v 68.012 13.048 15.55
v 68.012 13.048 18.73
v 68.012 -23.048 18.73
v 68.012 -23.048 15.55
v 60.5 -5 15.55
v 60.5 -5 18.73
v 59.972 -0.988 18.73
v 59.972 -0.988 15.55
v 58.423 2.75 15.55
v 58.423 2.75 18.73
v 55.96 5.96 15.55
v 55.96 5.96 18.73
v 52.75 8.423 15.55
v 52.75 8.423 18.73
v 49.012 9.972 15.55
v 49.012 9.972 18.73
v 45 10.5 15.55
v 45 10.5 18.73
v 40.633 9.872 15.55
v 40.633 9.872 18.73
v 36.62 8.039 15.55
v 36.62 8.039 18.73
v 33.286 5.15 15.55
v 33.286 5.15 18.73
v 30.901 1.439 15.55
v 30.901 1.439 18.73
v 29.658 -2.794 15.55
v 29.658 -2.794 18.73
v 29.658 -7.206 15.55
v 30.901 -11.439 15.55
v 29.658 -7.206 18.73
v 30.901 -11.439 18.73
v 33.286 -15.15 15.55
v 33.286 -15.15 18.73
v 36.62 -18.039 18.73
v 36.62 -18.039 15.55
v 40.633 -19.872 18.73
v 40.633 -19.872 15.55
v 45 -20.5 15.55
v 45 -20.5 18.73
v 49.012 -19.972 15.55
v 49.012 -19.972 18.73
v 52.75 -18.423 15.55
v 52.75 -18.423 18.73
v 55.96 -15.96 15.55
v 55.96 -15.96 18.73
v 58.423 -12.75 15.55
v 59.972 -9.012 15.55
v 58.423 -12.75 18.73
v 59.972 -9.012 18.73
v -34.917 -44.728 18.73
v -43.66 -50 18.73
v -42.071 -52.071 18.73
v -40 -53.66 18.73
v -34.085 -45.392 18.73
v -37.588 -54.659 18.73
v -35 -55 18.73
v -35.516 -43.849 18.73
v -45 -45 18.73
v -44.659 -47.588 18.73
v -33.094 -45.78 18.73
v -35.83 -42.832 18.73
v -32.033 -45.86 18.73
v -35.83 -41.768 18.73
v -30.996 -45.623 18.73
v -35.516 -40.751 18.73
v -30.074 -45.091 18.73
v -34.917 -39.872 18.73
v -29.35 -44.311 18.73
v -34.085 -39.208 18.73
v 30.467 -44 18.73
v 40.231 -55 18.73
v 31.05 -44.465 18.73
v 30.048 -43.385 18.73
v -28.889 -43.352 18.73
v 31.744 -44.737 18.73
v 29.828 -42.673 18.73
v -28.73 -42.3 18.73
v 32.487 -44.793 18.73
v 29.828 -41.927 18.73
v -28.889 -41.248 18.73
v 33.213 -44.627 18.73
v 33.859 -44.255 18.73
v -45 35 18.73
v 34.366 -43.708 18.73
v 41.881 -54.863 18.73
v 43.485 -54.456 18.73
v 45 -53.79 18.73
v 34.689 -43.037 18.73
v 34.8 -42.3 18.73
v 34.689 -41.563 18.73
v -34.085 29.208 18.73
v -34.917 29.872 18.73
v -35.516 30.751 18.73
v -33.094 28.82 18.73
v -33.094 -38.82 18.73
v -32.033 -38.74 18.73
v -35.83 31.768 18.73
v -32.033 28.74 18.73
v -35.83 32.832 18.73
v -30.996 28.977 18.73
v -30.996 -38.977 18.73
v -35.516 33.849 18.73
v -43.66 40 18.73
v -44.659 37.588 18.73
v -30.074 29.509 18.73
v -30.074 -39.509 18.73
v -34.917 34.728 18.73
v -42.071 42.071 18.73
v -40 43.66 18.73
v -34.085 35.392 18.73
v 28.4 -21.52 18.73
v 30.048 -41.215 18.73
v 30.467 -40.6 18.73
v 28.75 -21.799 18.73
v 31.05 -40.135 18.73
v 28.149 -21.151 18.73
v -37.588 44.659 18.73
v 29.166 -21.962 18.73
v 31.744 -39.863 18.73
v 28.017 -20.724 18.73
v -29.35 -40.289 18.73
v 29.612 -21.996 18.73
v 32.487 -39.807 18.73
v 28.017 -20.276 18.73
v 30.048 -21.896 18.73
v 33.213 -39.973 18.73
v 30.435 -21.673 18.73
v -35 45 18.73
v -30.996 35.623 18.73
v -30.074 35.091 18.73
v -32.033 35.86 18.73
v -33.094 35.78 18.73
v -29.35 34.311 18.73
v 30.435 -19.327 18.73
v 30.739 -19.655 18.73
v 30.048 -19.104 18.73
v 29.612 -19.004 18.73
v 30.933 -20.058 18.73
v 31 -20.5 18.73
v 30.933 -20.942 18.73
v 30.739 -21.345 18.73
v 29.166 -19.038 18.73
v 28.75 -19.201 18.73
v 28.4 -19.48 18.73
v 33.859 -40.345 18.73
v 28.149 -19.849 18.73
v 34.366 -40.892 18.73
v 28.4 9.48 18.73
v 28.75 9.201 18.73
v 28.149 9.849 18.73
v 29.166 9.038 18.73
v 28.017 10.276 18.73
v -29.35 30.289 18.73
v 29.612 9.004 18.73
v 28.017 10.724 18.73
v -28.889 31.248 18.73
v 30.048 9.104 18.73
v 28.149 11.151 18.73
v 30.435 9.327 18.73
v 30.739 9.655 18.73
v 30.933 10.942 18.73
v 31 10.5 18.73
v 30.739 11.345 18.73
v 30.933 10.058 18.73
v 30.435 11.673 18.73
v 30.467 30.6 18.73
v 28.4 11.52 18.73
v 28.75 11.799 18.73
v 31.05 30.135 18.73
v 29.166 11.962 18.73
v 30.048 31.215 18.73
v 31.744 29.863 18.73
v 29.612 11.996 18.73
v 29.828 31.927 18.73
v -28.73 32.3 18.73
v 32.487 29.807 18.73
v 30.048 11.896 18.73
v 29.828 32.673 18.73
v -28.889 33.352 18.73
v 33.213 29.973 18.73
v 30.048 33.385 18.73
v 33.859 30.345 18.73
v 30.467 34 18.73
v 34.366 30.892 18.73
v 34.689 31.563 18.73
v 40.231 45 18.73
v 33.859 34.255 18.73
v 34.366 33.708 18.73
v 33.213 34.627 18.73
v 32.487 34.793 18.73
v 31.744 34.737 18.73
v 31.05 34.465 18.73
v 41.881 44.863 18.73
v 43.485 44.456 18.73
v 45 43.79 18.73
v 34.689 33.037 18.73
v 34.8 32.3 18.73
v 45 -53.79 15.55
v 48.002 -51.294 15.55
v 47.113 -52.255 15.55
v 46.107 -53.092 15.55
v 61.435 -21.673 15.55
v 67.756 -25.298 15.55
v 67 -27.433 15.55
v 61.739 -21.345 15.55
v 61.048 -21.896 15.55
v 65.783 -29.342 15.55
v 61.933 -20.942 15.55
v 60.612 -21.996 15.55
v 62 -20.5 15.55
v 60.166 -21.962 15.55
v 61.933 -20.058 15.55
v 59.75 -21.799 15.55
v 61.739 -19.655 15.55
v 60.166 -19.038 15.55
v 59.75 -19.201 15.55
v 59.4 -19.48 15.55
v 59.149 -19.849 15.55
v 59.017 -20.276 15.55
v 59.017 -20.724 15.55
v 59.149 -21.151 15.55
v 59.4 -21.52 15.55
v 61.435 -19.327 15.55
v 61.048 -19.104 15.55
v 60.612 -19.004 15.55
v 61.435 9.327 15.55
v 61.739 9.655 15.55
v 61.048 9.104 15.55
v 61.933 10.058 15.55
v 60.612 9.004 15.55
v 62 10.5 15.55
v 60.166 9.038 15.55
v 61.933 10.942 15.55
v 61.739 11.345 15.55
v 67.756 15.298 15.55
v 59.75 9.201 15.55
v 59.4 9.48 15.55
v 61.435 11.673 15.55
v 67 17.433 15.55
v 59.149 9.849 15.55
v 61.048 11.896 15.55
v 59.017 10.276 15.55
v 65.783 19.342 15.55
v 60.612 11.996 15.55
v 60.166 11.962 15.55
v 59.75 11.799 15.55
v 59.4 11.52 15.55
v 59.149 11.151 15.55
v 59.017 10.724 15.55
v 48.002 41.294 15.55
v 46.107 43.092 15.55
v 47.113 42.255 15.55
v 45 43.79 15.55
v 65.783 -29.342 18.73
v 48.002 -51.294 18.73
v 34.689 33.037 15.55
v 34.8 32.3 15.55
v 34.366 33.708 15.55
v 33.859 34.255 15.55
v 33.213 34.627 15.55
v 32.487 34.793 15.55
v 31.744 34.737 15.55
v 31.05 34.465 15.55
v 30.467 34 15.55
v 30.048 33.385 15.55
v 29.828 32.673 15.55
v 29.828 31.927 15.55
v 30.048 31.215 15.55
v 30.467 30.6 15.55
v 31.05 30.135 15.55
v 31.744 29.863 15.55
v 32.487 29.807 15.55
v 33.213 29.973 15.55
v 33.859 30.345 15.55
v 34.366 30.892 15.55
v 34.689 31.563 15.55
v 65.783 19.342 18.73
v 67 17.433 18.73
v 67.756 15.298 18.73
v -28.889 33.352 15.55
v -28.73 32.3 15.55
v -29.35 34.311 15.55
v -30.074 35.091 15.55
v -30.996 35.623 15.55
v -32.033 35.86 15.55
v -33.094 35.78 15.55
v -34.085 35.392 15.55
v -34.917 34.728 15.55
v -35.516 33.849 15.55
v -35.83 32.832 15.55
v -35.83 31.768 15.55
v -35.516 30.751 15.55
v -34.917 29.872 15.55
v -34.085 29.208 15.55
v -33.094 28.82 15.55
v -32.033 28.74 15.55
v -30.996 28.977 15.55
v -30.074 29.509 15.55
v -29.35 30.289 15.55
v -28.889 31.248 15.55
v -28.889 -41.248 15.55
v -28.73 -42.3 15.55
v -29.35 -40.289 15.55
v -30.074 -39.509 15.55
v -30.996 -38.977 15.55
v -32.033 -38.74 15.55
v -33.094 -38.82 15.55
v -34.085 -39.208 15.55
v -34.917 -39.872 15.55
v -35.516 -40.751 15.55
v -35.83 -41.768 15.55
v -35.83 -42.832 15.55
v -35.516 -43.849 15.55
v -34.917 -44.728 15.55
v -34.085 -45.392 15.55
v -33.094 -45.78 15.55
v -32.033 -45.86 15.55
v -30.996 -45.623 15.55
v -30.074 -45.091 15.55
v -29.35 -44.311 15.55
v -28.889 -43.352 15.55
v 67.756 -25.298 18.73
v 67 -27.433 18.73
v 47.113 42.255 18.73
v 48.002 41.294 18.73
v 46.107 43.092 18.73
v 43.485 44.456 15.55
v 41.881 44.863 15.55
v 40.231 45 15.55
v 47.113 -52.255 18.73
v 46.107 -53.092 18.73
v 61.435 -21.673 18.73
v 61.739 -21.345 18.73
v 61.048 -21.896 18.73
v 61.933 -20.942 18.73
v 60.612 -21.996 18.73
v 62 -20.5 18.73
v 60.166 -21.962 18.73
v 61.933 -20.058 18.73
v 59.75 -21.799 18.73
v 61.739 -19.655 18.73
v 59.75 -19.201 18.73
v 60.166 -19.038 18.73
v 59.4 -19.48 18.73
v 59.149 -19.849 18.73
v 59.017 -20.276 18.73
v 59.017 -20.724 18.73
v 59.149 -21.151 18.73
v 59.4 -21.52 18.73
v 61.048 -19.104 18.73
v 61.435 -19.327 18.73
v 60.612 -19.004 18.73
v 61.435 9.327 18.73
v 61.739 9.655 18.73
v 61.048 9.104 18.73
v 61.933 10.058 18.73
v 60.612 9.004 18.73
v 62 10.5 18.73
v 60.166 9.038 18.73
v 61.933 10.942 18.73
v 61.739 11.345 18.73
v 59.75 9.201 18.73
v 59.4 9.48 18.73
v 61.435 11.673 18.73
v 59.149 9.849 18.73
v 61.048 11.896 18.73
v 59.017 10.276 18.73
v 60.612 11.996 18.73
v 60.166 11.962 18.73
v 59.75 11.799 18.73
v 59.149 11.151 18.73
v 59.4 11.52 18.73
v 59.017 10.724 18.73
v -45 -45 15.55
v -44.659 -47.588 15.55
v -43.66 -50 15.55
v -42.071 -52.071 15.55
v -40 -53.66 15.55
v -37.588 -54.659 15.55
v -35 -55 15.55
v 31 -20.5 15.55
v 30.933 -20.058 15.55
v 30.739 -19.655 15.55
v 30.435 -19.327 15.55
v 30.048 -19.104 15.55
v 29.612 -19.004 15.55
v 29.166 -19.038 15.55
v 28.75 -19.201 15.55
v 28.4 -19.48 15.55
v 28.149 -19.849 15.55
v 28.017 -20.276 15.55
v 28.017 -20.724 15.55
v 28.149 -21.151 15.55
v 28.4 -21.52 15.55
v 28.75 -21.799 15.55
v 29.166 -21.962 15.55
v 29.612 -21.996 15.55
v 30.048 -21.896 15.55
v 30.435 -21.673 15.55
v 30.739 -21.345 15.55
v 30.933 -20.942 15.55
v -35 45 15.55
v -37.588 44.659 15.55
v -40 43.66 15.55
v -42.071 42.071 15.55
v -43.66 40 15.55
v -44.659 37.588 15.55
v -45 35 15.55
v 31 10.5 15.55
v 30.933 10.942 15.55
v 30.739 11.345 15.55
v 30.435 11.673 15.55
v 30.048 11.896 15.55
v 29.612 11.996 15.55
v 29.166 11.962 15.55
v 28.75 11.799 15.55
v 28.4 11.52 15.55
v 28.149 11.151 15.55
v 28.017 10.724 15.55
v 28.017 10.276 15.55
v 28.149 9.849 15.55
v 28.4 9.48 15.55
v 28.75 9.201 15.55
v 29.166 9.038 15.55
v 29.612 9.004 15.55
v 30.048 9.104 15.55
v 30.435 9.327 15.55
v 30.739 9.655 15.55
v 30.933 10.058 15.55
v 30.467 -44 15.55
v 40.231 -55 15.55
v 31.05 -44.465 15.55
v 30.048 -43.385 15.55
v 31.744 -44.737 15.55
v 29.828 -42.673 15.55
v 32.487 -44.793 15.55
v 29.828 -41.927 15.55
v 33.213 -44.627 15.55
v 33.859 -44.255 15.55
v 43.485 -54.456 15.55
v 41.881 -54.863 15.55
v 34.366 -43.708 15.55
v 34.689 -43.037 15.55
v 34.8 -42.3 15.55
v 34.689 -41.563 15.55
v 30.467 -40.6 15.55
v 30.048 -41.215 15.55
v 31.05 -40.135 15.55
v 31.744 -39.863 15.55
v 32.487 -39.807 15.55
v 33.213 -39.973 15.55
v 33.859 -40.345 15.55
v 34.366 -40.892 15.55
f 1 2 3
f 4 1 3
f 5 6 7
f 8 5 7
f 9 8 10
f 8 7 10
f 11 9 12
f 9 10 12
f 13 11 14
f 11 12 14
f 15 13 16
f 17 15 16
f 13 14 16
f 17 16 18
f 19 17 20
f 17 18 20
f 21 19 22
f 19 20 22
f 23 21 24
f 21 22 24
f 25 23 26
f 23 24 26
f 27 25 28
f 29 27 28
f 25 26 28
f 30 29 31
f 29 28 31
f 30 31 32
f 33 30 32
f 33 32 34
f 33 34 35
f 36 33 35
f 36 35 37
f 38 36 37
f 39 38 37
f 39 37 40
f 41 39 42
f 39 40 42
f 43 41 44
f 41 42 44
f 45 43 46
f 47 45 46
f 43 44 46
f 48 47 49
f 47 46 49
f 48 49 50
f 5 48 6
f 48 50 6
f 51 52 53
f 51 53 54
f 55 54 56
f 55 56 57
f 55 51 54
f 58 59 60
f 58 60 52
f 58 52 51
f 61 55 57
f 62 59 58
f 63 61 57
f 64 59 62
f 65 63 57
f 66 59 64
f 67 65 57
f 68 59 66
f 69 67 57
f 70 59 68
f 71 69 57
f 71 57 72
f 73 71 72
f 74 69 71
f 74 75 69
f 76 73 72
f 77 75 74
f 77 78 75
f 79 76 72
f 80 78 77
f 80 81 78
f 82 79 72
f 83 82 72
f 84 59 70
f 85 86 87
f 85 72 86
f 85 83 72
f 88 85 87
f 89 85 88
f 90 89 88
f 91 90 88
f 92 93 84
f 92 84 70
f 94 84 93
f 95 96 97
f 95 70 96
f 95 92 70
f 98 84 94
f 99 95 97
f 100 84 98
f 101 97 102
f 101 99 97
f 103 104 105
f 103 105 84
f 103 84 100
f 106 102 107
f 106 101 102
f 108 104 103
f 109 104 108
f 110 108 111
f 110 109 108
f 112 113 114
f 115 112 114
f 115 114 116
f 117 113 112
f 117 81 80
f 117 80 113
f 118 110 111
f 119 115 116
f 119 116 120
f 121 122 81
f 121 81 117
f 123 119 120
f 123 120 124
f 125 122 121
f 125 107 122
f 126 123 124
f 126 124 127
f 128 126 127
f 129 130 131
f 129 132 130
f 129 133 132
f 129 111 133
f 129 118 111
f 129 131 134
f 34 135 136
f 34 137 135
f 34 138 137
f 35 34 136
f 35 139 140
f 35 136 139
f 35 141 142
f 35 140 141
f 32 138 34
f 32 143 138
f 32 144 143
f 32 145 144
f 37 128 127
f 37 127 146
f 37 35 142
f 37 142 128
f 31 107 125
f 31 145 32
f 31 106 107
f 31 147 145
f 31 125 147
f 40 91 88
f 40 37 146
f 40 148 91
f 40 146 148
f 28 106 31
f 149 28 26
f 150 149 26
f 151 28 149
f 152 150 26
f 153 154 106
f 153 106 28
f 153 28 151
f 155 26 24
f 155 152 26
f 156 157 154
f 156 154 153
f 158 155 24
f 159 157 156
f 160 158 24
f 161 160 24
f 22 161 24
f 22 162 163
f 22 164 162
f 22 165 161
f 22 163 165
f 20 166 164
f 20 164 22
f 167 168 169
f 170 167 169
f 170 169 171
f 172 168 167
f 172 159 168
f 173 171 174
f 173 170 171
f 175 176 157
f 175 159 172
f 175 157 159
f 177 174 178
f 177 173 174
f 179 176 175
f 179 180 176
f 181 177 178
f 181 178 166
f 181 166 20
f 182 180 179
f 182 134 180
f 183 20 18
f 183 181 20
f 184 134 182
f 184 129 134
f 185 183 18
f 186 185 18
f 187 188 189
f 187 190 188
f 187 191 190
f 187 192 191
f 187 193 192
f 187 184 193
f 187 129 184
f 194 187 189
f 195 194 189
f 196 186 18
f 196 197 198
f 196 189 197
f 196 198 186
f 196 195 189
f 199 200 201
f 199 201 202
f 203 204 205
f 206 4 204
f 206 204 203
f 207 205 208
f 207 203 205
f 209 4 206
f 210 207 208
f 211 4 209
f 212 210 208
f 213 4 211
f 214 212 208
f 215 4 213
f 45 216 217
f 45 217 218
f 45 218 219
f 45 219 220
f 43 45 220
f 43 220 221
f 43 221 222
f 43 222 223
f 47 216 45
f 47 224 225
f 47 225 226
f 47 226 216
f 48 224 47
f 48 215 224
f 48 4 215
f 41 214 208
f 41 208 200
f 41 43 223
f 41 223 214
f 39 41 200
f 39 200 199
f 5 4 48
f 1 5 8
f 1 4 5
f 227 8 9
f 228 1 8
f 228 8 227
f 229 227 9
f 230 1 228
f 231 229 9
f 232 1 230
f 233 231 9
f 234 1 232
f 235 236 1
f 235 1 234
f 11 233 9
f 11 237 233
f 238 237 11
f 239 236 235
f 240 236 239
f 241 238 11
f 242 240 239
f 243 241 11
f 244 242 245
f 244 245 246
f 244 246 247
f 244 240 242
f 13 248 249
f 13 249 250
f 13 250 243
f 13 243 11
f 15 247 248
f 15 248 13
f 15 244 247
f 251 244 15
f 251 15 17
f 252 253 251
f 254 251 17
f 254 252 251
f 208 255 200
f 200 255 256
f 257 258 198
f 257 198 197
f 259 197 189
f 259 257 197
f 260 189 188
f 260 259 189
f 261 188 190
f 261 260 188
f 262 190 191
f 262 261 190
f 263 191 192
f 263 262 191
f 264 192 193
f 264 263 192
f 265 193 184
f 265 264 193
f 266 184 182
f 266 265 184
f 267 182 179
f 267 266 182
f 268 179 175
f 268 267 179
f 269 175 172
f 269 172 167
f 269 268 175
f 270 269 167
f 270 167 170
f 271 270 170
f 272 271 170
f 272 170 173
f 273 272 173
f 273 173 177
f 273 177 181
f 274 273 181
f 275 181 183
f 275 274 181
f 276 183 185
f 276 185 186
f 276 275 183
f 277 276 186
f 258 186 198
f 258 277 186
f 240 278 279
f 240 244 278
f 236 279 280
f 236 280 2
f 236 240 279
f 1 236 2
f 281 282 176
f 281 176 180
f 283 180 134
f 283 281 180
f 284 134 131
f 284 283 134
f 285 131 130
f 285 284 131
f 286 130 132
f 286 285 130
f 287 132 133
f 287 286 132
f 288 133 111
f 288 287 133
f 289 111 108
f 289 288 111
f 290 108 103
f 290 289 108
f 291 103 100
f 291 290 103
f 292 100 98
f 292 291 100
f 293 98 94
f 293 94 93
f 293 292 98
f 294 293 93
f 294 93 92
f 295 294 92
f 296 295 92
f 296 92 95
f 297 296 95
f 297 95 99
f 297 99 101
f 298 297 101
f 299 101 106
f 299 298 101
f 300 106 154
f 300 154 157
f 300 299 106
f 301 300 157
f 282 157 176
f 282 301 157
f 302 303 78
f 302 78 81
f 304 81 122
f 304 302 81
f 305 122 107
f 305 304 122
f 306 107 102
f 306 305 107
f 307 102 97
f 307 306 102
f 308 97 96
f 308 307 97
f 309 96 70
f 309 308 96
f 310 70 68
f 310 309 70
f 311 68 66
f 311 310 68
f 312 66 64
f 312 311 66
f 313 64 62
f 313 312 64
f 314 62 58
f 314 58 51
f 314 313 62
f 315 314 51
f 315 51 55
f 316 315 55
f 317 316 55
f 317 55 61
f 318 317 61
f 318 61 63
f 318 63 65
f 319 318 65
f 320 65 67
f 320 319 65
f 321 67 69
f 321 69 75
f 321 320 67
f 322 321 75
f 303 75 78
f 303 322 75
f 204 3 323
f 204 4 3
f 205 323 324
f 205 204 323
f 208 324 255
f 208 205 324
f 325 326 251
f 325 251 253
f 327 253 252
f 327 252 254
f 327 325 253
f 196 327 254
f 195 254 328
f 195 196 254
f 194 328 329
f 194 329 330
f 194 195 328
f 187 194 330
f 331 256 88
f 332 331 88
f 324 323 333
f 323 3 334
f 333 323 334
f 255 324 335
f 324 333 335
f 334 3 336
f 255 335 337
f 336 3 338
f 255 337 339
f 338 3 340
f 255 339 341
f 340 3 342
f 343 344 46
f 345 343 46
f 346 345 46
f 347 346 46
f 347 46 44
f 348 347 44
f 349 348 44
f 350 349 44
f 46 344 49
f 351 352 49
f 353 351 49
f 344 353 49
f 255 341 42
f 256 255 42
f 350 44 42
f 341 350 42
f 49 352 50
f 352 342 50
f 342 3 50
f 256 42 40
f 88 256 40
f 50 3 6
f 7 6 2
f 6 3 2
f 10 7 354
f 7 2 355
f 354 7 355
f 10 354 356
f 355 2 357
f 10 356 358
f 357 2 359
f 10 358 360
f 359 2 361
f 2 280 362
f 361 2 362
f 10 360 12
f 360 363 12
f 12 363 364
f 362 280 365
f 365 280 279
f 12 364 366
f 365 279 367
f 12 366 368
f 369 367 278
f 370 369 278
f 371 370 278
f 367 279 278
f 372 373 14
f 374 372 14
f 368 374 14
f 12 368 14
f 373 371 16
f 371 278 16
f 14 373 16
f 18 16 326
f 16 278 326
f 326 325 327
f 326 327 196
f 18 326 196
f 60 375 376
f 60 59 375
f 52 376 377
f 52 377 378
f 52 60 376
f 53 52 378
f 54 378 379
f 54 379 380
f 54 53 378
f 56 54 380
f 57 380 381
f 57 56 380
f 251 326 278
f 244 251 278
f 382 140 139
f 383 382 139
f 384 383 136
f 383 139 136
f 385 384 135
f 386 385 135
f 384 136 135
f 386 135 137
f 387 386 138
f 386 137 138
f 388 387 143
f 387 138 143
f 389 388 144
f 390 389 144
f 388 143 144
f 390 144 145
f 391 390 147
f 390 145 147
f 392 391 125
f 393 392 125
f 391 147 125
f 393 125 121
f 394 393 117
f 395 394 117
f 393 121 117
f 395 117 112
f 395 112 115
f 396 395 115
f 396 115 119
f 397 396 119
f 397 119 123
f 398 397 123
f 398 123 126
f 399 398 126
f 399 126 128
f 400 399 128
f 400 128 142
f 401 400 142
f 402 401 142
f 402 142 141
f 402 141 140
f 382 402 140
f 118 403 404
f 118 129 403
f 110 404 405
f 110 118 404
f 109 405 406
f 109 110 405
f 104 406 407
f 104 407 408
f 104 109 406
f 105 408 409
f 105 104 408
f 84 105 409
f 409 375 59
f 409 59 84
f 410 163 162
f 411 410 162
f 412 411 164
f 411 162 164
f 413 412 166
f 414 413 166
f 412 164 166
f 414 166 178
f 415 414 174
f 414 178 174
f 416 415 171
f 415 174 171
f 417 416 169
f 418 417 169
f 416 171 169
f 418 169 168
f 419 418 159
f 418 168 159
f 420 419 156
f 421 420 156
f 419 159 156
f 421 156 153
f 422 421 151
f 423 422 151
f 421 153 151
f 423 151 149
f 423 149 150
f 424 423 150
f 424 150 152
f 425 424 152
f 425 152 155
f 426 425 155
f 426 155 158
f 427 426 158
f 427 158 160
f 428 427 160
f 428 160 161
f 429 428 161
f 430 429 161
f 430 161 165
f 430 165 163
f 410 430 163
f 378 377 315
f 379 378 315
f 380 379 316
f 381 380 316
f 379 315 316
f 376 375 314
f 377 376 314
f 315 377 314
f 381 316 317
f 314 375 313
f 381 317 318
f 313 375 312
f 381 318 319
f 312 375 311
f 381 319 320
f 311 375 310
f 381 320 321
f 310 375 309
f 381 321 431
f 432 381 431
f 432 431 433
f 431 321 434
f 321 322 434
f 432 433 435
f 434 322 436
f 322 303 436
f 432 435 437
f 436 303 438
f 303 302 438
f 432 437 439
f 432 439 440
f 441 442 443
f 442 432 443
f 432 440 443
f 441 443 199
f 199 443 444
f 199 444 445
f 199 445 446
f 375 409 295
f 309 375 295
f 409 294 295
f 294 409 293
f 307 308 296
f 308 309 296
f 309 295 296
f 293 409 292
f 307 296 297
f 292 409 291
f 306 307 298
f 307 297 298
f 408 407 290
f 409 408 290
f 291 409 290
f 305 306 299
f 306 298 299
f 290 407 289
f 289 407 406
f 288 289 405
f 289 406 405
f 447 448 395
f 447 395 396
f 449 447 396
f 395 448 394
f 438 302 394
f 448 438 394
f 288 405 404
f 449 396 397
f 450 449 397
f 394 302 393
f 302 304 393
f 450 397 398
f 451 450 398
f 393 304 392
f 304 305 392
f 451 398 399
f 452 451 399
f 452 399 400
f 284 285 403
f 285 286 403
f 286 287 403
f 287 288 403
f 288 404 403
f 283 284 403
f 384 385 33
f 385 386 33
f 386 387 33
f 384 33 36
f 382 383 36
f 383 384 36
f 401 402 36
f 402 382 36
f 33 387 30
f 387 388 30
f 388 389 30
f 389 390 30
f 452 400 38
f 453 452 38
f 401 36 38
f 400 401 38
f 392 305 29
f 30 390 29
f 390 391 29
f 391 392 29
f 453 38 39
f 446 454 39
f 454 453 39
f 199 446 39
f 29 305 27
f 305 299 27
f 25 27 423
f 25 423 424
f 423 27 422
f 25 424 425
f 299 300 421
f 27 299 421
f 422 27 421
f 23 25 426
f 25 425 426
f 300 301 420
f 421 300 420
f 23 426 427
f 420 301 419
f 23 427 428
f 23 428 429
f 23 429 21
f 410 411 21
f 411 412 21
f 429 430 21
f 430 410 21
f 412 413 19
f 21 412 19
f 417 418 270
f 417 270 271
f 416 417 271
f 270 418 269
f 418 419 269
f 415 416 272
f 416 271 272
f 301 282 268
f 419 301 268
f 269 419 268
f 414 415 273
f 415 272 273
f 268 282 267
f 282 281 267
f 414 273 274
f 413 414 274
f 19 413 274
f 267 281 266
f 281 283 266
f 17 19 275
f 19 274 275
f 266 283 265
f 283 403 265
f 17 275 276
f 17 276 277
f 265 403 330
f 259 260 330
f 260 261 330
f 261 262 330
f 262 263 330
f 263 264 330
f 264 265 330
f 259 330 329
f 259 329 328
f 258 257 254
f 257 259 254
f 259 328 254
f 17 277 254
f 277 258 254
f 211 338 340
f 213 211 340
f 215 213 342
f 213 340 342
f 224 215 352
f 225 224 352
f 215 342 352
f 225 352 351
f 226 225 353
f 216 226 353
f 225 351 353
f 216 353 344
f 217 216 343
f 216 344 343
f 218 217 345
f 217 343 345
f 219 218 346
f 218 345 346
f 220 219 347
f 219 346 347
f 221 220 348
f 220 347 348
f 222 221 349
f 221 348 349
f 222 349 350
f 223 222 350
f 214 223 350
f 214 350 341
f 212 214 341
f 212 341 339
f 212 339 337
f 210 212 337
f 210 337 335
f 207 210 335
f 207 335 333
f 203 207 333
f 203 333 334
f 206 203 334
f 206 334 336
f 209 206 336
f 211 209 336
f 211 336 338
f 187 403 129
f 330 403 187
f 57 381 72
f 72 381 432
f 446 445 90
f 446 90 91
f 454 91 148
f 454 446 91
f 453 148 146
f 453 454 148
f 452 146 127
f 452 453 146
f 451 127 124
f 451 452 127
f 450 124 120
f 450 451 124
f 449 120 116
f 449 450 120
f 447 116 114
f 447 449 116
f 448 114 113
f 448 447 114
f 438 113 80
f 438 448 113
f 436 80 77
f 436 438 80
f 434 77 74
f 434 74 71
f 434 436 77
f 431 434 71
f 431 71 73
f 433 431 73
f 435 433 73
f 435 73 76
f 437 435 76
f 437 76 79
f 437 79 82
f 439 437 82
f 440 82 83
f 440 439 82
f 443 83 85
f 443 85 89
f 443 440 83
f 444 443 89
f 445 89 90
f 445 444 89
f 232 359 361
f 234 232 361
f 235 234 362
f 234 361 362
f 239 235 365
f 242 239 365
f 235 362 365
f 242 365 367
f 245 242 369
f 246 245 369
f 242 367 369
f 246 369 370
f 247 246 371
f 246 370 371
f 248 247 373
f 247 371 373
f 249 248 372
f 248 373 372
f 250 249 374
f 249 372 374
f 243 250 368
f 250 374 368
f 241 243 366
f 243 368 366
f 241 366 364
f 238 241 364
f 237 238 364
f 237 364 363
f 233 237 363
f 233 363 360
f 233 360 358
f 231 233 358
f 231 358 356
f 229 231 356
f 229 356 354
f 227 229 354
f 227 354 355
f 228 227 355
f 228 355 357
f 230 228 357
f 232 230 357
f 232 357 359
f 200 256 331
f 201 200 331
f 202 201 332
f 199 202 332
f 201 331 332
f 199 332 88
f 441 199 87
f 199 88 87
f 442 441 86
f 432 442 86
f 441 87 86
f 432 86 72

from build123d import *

# Parameters (mm, degrees)
BOSS_EXTRUDE1_START = 15.549813
SKETCH1_W           = 90
SKETCH1_H           = 100
SKETCH1_R           = 2.5
SKETCH1_R_2         = 3.57
BOSS_EXTRUDE1_DEPTH = 3.18
BOSS_EXTRUDE2_DEPTH = 3.18
SKETCH3_R           = 1.5
SKETCH3_R_2         = 15.5
CUT_EXTRUDE1_DEPTH  = 10
FILLET1_R           = 10


with BuildPart() as part:
    # Sketch1 → Boss-Extrude1 (new body)
    with BuildSketch(Plane.XY.offset(BOSS_EXTRUDE1_START)):
        with Locations((0, -5)):
            Rectangle(SKETCH1_W, SKETCH1_H)
        with Locations((32.3, -42.3)):
            Circle(SKETCH1_R, mode=Mode.SUBTRACT)
        with Locations((-32.3, -42.3)):
            Circle(SKETCH1_R_2, mode=Mode.SUBTRACT)
        with Locations((-32.3, 32.3)):
            Circle(SKETCH1_R_2, mode=Mode.SUBTRACT)
        with Locations((32.3, 32.3)):
            Circle(SKETCH1_R, mode=Mode.SUBTRACT)
    extrude(amount=BOSS_EXTRUDE1_DEPTH)

    # Sketch2 → Boss-Extrude2 (add, through all)
    with BuildSketch(Plane.XY.offset(18.729812892)):
        Polygon((45, 45), (68.012220348, 16.59), (68.012220348, -26.59), (45, -55), align=None)
    extrude(amount=-BOSS_EXTRUDE2_DEPTH)

    # Sketch3 → Cut-Extrude1 (cut)
    with BuildSketch(Plane.XY.offset(18.729812892)):
        with Locations((29.5, 10.5)):
            Circle(SKETCH3_R)
        with Locations((60.5, 10.5)):
            Circle(SKETCH3_R)
        with Locations((60.5, -20.5)):
            Circle(SKETCH3_R)
        with Locations((29.5, -20.5)):
            Circle(SKETCH3_R)
        with Locations((45, -5)):
            Circle(SKETCH3_R_2)
    extrude(amount=-CUT_EXTRUDE1_DEPTH, mode=Mode.SUBTRACT)

    # Fillet1
    fillet1_edges = [part.edges().sort_by_distance(p)[0] for p in [
        (68.012220348, 16.59, 17.139812892),
        (68.012220348, -26.59, 17.139812892),
        (-45, 45, 17.139813),
        (45, 45, 17.139813),
        (45, -55, 17.139813),
        (-45, -55, 17.139813),
    ]]
    fillet(fillet1_edges, radius=FILLET1_R)


solid = part.part
